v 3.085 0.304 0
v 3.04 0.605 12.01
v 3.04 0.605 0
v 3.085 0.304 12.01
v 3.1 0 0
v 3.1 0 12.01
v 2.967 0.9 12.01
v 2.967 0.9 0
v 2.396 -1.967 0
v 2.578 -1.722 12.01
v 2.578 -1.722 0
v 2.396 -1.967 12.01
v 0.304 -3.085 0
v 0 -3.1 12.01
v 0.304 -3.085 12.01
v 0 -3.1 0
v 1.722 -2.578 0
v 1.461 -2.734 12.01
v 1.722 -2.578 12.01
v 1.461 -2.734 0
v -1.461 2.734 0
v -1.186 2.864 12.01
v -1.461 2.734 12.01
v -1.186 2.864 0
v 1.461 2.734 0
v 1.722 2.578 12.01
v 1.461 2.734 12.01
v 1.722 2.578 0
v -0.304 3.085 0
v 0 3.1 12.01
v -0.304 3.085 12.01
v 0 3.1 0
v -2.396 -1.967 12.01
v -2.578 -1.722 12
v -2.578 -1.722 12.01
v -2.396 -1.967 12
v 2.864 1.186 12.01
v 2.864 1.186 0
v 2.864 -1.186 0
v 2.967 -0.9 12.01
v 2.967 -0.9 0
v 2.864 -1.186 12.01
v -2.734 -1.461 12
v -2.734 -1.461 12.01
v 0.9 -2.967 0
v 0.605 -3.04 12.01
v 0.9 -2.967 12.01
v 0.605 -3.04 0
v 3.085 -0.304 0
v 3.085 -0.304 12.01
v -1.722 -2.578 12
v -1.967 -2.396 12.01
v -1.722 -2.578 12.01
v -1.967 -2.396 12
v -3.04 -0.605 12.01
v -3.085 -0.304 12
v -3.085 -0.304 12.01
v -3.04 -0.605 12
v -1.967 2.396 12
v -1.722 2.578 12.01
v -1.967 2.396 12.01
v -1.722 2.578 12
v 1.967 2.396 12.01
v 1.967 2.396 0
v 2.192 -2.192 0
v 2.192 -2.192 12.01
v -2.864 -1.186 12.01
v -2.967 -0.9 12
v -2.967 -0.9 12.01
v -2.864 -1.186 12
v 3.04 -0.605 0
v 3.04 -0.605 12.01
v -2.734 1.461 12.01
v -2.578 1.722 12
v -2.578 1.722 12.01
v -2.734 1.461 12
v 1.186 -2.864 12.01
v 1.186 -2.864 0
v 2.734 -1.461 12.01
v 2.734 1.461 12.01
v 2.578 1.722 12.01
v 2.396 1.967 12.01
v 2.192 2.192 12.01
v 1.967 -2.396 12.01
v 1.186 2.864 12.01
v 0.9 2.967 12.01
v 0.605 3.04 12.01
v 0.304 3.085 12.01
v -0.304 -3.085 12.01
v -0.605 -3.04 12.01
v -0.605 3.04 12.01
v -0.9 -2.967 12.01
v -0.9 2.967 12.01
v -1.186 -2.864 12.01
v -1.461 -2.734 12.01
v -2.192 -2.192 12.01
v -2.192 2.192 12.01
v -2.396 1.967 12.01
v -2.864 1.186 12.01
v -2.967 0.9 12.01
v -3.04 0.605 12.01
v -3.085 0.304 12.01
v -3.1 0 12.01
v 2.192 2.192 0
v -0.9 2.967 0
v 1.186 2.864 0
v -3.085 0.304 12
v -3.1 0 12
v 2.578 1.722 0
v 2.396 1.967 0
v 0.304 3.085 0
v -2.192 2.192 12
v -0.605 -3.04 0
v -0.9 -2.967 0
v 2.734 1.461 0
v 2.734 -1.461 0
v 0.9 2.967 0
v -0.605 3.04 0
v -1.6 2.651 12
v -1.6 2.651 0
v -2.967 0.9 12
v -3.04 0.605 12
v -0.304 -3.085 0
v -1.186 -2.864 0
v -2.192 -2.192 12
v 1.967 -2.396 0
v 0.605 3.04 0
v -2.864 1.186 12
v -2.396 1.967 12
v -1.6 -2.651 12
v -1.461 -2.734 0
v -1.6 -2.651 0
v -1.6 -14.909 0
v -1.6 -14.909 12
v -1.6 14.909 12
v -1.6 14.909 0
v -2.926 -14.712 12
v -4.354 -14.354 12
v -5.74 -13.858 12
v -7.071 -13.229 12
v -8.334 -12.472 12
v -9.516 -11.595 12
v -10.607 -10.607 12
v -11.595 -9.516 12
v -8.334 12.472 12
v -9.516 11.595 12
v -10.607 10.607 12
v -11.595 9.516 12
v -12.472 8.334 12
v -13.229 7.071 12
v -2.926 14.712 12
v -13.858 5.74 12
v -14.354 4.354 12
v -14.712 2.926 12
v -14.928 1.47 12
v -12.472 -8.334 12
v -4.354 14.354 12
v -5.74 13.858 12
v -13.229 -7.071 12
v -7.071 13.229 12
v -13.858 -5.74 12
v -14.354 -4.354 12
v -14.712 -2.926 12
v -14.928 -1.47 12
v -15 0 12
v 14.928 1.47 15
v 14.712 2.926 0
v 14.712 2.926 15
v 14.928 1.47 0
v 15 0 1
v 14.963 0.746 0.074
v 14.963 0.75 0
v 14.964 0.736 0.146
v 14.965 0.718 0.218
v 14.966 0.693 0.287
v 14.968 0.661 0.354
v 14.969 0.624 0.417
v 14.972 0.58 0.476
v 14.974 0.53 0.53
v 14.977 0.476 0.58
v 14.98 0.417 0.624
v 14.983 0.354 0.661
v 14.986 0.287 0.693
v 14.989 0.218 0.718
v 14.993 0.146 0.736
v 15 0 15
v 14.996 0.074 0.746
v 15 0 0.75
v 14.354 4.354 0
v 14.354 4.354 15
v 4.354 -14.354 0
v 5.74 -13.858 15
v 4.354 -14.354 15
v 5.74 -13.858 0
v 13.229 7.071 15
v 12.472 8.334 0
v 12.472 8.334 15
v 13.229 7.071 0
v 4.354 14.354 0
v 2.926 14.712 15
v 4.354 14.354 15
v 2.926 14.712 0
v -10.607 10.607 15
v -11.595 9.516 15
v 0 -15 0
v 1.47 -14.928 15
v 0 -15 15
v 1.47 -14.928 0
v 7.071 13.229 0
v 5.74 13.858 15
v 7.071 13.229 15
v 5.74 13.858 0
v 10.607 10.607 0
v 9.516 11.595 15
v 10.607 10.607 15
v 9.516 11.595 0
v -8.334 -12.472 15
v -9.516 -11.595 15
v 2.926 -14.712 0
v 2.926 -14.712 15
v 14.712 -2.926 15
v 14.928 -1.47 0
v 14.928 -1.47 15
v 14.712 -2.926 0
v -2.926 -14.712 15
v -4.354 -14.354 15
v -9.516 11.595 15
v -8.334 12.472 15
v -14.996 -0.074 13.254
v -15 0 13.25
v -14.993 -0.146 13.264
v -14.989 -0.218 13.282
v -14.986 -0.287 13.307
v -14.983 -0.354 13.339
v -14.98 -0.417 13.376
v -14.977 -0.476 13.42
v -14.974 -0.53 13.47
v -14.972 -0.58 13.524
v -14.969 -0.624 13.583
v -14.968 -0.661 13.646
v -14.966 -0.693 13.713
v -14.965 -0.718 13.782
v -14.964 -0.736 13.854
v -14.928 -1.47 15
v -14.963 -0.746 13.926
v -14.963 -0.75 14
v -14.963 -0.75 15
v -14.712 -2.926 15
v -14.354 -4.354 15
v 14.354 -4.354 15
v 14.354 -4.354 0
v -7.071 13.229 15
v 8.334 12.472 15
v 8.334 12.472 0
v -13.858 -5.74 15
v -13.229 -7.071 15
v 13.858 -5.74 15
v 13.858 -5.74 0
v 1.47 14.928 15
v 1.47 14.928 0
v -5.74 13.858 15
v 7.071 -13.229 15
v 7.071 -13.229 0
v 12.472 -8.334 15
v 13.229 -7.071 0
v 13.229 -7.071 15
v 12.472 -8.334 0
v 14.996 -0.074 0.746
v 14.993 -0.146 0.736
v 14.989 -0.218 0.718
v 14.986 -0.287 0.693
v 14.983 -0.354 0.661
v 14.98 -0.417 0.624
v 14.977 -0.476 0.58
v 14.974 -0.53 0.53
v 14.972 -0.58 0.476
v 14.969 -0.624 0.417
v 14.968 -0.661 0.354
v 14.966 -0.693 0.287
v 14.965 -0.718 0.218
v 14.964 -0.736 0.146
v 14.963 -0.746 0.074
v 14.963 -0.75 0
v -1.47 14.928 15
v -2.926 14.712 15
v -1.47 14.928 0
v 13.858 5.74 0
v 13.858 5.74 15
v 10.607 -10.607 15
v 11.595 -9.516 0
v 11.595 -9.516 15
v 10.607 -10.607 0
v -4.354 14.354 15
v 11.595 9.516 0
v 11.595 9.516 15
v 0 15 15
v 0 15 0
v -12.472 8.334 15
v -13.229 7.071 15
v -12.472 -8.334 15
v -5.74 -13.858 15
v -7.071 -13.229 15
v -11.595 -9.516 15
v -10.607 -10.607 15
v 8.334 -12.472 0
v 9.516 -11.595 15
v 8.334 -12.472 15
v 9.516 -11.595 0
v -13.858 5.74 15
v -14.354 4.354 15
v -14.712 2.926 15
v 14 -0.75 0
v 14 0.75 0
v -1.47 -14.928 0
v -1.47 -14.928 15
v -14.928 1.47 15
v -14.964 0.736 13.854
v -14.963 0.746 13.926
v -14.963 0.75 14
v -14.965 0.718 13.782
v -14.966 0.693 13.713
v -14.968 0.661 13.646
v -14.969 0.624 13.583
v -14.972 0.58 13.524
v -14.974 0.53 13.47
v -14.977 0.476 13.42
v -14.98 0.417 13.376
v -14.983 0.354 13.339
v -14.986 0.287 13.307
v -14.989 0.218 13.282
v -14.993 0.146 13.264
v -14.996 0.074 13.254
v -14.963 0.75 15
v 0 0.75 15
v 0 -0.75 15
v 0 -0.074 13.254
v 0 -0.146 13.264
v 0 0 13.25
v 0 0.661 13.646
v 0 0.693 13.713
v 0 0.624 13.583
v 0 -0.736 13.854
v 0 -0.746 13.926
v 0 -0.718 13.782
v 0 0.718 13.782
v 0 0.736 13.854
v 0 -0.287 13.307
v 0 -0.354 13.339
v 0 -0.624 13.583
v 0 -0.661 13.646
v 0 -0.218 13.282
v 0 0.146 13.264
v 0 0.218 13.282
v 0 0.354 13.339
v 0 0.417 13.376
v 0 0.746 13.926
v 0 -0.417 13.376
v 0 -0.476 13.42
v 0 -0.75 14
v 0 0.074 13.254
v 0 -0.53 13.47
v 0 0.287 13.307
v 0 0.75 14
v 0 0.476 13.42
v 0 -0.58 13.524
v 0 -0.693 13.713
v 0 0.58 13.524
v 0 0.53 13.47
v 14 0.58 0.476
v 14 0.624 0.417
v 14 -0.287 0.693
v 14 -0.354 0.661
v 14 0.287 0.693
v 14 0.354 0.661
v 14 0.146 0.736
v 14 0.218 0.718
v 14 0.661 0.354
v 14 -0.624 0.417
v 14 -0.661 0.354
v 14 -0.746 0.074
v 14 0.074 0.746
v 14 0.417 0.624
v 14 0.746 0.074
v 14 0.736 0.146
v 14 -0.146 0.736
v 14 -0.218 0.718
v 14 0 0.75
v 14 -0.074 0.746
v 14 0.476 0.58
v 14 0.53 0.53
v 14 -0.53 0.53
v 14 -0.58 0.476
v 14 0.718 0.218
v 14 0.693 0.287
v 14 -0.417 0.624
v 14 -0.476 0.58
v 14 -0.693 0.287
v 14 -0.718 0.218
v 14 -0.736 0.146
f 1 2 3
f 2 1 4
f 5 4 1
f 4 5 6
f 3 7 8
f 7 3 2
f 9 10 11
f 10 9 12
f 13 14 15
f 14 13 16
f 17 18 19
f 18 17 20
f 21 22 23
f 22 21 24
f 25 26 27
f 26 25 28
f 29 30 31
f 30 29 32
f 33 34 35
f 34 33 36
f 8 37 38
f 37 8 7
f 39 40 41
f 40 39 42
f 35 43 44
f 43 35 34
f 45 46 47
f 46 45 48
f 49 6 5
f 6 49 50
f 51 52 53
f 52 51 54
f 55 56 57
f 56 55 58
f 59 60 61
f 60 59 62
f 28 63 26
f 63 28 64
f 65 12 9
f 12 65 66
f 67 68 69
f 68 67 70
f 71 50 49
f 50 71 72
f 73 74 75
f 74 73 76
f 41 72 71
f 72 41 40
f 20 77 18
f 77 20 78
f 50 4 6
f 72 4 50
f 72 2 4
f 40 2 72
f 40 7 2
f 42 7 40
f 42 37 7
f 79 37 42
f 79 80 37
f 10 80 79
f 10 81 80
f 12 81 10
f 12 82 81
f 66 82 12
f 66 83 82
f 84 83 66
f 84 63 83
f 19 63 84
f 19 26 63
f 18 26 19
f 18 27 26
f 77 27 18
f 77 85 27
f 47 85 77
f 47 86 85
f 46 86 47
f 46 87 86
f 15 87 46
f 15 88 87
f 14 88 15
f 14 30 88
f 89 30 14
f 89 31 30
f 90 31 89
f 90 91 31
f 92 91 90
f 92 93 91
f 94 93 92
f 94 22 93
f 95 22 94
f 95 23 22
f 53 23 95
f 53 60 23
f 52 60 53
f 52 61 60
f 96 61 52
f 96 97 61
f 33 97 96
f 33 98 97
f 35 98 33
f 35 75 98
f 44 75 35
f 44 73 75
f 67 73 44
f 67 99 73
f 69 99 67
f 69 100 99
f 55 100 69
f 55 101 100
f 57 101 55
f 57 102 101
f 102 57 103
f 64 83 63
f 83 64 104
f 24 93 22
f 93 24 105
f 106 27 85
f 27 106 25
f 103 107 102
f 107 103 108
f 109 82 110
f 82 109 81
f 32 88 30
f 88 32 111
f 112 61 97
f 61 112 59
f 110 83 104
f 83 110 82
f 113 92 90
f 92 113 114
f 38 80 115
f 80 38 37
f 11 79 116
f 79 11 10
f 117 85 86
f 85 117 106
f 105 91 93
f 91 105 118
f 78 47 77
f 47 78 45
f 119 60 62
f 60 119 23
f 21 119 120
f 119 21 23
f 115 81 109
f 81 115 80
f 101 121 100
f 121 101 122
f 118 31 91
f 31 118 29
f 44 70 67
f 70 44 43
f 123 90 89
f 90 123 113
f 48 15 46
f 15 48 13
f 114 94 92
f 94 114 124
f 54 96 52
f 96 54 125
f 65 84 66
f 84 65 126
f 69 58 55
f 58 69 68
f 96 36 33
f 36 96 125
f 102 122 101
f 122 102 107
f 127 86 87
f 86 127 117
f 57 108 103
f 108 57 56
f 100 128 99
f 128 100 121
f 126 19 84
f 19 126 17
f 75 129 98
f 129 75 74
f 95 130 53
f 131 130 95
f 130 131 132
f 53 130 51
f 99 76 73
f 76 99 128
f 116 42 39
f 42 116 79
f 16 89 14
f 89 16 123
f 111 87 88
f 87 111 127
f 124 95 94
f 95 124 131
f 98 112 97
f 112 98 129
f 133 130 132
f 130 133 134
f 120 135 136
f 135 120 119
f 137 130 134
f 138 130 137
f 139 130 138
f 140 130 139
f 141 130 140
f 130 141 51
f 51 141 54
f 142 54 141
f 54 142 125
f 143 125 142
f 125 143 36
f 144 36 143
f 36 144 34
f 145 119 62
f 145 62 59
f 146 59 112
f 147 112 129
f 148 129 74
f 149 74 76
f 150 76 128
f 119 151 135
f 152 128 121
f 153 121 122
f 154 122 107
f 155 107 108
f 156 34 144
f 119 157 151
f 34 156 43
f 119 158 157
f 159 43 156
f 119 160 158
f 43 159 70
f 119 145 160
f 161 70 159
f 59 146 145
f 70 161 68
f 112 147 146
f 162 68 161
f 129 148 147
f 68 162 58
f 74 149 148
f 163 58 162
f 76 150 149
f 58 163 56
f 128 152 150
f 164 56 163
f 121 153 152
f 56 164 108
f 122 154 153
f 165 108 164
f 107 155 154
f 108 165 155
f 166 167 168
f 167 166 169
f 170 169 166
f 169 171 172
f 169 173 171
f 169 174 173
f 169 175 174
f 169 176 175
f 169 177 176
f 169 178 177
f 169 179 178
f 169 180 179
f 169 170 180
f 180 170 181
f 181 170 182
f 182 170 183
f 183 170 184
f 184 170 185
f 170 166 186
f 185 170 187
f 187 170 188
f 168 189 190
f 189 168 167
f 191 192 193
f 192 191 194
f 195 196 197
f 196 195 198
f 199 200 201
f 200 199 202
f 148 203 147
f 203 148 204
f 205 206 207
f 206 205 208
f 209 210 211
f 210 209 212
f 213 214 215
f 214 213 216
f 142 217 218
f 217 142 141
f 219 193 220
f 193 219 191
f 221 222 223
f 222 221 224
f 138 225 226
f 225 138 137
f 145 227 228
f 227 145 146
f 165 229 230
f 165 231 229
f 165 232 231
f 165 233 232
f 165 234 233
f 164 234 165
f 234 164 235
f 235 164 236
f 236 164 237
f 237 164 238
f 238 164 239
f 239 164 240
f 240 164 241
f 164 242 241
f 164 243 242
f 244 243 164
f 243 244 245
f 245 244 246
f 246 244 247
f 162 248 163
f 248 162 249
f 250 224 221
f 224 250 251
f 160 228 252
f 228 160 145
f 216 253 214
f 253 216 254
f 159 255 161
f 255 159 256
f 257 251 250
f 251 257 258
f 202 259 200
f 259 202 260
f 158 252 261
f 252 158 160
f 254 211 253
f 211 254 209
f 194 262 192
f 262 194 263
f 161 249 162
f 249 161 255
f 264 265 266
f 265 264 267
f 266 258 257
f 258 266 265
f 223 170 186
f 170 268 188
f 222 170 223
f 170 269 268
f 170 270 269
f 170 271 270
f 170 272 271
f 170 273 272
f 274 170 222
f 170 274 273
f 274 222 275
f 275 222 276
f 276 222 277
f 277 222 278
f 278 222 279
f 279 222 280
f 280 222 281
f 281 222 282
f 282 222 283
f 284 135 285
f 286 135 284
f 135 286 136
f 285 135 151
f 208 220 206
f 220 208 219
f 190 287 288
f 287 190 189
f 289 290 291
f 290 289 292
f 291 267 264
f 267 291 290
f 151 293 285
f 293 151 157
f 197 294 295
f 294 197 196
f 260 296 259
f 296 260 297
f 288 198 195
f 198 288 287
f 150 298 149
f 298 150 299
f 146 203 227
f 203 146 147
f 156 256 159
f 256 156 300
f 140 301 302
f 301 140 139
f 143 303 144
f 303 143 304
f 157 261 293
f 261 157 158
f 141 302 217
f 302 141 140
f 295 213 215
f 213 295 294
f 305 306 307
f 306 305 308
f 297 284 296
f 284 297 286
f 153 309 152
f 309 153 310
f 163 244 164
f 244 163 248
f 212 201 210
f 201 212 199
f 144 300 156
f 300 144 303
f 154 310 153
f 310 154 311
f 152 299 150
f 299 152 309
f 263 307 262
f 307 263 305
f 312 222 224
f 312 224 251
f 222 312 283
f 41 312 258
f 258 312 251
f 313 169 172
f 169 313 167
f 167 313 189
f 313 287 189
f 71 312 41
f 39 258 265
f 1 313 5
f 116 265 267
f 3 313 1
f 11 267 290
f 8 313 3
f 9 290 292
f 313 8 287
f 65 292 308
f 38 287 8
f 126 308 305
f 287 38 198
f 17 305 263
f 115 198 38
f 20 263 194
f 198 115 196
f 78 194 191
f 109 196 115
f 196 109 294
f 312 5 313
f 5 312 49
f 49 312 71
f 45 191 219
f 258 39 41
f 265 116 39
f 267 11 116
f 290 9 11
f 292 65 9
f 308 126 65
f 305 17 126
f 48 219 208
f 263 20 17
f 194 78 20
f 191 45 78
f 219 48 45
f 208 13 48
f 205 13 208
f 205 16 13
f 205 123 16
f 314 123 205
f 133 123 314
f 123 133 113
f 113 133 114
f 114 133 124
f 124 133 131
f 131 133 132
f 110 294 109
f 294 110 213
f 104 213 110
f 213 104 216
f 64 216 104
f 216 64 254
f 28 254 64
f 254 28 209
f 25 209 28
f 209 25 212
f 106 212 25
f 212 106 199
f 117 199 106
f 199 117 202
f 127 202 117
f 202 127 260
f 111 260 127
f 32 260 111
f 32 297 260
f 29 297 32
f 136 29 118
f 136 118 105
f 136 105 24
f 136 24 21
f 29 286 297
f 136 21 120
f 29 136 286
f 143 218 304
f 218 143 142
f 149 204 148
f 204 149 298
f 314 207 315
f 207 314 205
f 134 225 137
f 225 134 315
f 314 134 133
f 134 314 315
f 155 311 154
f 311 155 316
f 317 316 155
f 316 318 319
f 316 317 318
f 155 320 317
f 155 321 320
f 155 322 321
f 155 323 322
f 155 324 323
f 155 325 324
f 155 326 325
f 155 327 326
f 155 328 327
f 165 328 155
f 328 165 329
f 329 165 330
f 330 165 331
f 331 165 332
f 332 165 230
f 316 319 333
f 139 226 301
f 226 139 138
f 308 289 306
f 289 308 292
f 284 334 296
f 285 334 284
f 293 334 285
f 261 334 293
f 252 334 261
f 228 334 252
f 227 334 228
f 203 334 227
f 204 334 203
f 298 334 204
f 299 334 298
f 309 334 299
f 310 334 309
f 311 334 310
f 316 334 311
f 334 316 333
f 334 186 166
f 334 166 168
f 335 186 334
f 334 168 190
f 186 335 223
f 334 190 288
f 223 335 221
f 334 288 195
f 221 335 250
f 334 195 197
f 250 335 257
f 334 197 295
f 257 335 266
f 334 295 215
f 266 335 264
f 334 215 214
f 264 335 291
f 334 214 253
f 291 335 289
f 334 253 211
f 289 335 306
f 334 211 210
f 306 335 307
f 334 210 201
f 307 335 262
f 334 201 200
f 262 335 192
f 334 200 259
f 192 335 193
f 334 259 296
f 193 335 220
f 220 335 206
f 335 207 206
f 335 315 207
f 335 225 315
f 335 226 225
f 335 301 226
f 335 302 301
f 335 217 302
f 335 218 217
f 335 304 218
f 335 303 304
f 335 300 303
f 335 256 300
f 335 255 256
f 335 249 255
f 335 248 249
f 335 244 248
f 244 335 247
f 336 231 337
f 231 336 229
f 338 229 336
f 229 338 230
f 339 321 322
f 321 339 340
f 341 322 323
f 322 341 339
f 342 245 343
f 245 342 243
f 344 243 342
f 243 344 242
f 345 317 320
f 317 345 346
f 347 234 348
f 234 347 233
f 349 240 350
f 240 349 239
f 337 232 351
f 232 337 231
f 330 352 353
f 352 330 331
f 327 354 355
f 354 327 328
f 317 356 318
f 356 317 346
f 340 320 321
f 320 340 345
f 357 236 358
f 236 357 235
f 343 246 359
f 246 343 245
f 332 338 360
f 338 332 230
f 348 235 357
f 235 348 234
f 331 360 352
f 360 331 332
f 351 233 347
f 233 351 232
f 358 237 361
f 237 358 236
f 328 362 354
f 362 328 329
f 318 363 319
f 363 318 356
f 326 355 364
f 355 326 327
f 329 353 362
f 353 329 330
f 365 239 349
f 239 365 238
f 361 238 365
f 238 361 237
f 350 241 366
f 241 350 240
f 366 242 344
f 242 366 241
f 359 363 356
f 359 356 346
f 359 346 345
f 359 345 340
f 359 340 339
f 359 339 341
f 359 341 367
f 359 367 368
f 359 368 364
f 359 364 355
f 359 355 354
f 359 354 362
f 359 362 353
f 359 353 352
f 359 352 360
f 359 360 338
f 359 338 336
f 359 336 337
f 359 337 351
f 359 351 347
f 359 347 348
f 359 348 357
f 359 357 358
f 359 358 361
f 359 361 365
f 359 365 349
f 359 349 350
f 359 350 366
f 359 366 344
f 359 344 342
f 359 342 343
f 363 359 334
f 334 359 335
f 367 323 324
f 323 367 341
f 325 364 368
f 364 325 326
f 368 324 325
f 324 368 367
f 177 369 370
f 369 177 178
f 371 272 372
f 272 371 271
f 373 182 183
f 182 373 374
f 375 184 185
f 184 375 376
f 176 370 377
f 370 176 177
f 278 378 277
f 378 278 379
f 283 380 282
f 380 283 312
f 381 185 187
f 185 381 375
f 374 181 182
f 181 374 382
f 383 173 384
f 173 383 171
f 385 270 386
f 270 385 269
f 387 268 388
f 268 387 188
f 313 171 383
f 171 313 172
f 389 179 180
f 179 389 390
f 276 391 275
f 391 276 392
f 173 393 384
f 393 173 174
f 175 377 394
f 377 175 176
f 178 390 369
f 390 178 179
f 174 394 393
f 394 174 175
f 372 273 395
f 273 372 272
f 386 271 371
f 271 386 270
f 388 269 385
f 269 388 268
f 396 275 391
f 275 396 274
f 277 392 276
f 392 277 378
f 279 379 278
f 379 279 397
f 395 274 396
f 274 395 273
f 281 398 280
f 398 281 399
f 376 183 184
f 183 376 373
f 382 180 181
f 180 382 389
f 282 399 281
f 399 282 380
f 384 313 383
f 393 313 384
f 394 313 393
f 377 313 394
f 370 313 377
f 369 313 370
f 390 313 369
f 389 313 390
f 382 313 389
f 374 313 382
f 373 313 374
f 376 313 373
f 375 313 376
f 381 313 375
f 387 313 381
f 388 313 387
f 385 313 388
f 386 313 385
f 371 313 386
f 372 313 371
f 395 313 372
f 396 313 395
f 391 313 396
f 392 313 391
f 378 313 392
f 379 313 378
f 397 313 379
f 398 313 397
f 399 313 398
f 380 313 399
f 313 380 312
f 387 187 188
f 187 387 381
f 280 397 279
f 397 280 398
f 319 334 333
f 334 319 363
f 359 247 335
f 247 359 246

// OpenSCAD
// Replacement knob for a hotplate stirrer with a 6 mm D-shaft.
// Designed for FDM printing, resting on the bottom face (z=0).

// --- Dimensions ---
knob_diameter = 30.0;      // Total diameter of the knob
knob_height   = 15.0;      // Total height of the knob
d_shaft_dia    = 6.2;       // Diameter of the circular part of the D-shaft
d_shaft_width  = 4.7;       // Distance from the flat to the opposite side
d_shaft_depth  = 12.0;      // Depth of the D-shaft bore into the knob

groove_dia     = 2.0;       // Diameter of the vertical grip grooves
num_grooves    = 18;        // Number of vertical grip grooves

pointer_width  = 1.5;       // Width of the pointer groove on top
pointer_depth  = 1.0;       // Depth of the pointer groove

$fn = 64;

// --- Calculations ---
// Diameter is 6.2, so radius is 3.1.
// If distance from flat to opposite side is 4.7, 
// the distance from center to flat is 4.7 - 3.1 = 1.6.
dist_center_to_flat = 1.6;

// --- Modeling ---

difference() {
    // 1. Main Knob Body
    cylinder(h = knob_height, d = knob_diameter);

    // 2. D-shaped Blind Bore
    // We create the D-shape by subtracting a cylinder and a block.
    // To ensure the knob remains centered, we subtract the D-shape from the center.
    translate([0, 0, -0.01]) {
        // Subtract the circular part
        cylinder(h = d_shaft_depth + 0.02, d = d_shaft_dia);
        
        // Subtract the part that makes it a "D"
        // The flat is at x = -1.6. We subtract everything from -knob_diameter to -1.6.
        // We use a large cube to ensure it cuts through the cylinder completely.
        translate([-knob_diameter, -knob_diameter, -0.01])
            cube([knob_diameter - dist_center_to_flat, knob_diameter * 2, d_shaft_depth + 0.02]);
    }

    // 3. Vertical Grip Grooves
    // 18 evenly spaced vertical grooves around the outside.
    for (i = [0 : num_grooves - 1]) {
        angle = i * (360 / num_grooves);
        rotate([0, 0, angle])
            // The groove is a half-cylinder centered on the outer surface.
            // We place the cylinder center at (knob_diameter/2)
            translate([knob_diameter / 2, 0, 0])
                rotate([0, 90, 0])
                    cylinder(h = knob_height + 2, d = groove_dia);
    }

    // 4. Top Pointer Groove
    // 1.5mm wide, 1mm deep, runs from center to edge, on the same side as the flat.
    // The flat is at x = -1.6. We place the groove on the negative X axis.
    // We use a cylinder for the groove to make it a proper "slot" rather than a block.
    // Or a thin cylinder/cube. Let's use a thin cylinder for a clean slot.
    rotate([0, 0, 180]) // Rotate to align with the negative X axis
    translate([0, 0, knob_height - pointer_depth])
    rotate([0, 90, 0])
    cylinder(h = knob_diameter, d = pointer_width);
    
    // To ensure the pointer groove is a "slot" from center to edge:
    // We use a thin cylinder oriented along the X axis.
    rotate([0, 90, 0])
    translate([0, 0, knob_height - pointer_depth])
    cylinder(h = knob_diameter, d = pointer_width);
    // Wait, the above is messy. Let's use a simple cube for the slot.
    // The slot is 1.5mm wide (Y), 1mm deep (Z), and runs from center to edge (X).
    // The flat is at x = -1.6. So the slot is on the negative X side.
    
    // Corrected Pointer Groove:
    translate([-knob_diameter, -pointer_width/2, knob_height - pointer_depth])
        cube([knob_diameter, pointer_width, pointer_depth + 0.1]);
}
